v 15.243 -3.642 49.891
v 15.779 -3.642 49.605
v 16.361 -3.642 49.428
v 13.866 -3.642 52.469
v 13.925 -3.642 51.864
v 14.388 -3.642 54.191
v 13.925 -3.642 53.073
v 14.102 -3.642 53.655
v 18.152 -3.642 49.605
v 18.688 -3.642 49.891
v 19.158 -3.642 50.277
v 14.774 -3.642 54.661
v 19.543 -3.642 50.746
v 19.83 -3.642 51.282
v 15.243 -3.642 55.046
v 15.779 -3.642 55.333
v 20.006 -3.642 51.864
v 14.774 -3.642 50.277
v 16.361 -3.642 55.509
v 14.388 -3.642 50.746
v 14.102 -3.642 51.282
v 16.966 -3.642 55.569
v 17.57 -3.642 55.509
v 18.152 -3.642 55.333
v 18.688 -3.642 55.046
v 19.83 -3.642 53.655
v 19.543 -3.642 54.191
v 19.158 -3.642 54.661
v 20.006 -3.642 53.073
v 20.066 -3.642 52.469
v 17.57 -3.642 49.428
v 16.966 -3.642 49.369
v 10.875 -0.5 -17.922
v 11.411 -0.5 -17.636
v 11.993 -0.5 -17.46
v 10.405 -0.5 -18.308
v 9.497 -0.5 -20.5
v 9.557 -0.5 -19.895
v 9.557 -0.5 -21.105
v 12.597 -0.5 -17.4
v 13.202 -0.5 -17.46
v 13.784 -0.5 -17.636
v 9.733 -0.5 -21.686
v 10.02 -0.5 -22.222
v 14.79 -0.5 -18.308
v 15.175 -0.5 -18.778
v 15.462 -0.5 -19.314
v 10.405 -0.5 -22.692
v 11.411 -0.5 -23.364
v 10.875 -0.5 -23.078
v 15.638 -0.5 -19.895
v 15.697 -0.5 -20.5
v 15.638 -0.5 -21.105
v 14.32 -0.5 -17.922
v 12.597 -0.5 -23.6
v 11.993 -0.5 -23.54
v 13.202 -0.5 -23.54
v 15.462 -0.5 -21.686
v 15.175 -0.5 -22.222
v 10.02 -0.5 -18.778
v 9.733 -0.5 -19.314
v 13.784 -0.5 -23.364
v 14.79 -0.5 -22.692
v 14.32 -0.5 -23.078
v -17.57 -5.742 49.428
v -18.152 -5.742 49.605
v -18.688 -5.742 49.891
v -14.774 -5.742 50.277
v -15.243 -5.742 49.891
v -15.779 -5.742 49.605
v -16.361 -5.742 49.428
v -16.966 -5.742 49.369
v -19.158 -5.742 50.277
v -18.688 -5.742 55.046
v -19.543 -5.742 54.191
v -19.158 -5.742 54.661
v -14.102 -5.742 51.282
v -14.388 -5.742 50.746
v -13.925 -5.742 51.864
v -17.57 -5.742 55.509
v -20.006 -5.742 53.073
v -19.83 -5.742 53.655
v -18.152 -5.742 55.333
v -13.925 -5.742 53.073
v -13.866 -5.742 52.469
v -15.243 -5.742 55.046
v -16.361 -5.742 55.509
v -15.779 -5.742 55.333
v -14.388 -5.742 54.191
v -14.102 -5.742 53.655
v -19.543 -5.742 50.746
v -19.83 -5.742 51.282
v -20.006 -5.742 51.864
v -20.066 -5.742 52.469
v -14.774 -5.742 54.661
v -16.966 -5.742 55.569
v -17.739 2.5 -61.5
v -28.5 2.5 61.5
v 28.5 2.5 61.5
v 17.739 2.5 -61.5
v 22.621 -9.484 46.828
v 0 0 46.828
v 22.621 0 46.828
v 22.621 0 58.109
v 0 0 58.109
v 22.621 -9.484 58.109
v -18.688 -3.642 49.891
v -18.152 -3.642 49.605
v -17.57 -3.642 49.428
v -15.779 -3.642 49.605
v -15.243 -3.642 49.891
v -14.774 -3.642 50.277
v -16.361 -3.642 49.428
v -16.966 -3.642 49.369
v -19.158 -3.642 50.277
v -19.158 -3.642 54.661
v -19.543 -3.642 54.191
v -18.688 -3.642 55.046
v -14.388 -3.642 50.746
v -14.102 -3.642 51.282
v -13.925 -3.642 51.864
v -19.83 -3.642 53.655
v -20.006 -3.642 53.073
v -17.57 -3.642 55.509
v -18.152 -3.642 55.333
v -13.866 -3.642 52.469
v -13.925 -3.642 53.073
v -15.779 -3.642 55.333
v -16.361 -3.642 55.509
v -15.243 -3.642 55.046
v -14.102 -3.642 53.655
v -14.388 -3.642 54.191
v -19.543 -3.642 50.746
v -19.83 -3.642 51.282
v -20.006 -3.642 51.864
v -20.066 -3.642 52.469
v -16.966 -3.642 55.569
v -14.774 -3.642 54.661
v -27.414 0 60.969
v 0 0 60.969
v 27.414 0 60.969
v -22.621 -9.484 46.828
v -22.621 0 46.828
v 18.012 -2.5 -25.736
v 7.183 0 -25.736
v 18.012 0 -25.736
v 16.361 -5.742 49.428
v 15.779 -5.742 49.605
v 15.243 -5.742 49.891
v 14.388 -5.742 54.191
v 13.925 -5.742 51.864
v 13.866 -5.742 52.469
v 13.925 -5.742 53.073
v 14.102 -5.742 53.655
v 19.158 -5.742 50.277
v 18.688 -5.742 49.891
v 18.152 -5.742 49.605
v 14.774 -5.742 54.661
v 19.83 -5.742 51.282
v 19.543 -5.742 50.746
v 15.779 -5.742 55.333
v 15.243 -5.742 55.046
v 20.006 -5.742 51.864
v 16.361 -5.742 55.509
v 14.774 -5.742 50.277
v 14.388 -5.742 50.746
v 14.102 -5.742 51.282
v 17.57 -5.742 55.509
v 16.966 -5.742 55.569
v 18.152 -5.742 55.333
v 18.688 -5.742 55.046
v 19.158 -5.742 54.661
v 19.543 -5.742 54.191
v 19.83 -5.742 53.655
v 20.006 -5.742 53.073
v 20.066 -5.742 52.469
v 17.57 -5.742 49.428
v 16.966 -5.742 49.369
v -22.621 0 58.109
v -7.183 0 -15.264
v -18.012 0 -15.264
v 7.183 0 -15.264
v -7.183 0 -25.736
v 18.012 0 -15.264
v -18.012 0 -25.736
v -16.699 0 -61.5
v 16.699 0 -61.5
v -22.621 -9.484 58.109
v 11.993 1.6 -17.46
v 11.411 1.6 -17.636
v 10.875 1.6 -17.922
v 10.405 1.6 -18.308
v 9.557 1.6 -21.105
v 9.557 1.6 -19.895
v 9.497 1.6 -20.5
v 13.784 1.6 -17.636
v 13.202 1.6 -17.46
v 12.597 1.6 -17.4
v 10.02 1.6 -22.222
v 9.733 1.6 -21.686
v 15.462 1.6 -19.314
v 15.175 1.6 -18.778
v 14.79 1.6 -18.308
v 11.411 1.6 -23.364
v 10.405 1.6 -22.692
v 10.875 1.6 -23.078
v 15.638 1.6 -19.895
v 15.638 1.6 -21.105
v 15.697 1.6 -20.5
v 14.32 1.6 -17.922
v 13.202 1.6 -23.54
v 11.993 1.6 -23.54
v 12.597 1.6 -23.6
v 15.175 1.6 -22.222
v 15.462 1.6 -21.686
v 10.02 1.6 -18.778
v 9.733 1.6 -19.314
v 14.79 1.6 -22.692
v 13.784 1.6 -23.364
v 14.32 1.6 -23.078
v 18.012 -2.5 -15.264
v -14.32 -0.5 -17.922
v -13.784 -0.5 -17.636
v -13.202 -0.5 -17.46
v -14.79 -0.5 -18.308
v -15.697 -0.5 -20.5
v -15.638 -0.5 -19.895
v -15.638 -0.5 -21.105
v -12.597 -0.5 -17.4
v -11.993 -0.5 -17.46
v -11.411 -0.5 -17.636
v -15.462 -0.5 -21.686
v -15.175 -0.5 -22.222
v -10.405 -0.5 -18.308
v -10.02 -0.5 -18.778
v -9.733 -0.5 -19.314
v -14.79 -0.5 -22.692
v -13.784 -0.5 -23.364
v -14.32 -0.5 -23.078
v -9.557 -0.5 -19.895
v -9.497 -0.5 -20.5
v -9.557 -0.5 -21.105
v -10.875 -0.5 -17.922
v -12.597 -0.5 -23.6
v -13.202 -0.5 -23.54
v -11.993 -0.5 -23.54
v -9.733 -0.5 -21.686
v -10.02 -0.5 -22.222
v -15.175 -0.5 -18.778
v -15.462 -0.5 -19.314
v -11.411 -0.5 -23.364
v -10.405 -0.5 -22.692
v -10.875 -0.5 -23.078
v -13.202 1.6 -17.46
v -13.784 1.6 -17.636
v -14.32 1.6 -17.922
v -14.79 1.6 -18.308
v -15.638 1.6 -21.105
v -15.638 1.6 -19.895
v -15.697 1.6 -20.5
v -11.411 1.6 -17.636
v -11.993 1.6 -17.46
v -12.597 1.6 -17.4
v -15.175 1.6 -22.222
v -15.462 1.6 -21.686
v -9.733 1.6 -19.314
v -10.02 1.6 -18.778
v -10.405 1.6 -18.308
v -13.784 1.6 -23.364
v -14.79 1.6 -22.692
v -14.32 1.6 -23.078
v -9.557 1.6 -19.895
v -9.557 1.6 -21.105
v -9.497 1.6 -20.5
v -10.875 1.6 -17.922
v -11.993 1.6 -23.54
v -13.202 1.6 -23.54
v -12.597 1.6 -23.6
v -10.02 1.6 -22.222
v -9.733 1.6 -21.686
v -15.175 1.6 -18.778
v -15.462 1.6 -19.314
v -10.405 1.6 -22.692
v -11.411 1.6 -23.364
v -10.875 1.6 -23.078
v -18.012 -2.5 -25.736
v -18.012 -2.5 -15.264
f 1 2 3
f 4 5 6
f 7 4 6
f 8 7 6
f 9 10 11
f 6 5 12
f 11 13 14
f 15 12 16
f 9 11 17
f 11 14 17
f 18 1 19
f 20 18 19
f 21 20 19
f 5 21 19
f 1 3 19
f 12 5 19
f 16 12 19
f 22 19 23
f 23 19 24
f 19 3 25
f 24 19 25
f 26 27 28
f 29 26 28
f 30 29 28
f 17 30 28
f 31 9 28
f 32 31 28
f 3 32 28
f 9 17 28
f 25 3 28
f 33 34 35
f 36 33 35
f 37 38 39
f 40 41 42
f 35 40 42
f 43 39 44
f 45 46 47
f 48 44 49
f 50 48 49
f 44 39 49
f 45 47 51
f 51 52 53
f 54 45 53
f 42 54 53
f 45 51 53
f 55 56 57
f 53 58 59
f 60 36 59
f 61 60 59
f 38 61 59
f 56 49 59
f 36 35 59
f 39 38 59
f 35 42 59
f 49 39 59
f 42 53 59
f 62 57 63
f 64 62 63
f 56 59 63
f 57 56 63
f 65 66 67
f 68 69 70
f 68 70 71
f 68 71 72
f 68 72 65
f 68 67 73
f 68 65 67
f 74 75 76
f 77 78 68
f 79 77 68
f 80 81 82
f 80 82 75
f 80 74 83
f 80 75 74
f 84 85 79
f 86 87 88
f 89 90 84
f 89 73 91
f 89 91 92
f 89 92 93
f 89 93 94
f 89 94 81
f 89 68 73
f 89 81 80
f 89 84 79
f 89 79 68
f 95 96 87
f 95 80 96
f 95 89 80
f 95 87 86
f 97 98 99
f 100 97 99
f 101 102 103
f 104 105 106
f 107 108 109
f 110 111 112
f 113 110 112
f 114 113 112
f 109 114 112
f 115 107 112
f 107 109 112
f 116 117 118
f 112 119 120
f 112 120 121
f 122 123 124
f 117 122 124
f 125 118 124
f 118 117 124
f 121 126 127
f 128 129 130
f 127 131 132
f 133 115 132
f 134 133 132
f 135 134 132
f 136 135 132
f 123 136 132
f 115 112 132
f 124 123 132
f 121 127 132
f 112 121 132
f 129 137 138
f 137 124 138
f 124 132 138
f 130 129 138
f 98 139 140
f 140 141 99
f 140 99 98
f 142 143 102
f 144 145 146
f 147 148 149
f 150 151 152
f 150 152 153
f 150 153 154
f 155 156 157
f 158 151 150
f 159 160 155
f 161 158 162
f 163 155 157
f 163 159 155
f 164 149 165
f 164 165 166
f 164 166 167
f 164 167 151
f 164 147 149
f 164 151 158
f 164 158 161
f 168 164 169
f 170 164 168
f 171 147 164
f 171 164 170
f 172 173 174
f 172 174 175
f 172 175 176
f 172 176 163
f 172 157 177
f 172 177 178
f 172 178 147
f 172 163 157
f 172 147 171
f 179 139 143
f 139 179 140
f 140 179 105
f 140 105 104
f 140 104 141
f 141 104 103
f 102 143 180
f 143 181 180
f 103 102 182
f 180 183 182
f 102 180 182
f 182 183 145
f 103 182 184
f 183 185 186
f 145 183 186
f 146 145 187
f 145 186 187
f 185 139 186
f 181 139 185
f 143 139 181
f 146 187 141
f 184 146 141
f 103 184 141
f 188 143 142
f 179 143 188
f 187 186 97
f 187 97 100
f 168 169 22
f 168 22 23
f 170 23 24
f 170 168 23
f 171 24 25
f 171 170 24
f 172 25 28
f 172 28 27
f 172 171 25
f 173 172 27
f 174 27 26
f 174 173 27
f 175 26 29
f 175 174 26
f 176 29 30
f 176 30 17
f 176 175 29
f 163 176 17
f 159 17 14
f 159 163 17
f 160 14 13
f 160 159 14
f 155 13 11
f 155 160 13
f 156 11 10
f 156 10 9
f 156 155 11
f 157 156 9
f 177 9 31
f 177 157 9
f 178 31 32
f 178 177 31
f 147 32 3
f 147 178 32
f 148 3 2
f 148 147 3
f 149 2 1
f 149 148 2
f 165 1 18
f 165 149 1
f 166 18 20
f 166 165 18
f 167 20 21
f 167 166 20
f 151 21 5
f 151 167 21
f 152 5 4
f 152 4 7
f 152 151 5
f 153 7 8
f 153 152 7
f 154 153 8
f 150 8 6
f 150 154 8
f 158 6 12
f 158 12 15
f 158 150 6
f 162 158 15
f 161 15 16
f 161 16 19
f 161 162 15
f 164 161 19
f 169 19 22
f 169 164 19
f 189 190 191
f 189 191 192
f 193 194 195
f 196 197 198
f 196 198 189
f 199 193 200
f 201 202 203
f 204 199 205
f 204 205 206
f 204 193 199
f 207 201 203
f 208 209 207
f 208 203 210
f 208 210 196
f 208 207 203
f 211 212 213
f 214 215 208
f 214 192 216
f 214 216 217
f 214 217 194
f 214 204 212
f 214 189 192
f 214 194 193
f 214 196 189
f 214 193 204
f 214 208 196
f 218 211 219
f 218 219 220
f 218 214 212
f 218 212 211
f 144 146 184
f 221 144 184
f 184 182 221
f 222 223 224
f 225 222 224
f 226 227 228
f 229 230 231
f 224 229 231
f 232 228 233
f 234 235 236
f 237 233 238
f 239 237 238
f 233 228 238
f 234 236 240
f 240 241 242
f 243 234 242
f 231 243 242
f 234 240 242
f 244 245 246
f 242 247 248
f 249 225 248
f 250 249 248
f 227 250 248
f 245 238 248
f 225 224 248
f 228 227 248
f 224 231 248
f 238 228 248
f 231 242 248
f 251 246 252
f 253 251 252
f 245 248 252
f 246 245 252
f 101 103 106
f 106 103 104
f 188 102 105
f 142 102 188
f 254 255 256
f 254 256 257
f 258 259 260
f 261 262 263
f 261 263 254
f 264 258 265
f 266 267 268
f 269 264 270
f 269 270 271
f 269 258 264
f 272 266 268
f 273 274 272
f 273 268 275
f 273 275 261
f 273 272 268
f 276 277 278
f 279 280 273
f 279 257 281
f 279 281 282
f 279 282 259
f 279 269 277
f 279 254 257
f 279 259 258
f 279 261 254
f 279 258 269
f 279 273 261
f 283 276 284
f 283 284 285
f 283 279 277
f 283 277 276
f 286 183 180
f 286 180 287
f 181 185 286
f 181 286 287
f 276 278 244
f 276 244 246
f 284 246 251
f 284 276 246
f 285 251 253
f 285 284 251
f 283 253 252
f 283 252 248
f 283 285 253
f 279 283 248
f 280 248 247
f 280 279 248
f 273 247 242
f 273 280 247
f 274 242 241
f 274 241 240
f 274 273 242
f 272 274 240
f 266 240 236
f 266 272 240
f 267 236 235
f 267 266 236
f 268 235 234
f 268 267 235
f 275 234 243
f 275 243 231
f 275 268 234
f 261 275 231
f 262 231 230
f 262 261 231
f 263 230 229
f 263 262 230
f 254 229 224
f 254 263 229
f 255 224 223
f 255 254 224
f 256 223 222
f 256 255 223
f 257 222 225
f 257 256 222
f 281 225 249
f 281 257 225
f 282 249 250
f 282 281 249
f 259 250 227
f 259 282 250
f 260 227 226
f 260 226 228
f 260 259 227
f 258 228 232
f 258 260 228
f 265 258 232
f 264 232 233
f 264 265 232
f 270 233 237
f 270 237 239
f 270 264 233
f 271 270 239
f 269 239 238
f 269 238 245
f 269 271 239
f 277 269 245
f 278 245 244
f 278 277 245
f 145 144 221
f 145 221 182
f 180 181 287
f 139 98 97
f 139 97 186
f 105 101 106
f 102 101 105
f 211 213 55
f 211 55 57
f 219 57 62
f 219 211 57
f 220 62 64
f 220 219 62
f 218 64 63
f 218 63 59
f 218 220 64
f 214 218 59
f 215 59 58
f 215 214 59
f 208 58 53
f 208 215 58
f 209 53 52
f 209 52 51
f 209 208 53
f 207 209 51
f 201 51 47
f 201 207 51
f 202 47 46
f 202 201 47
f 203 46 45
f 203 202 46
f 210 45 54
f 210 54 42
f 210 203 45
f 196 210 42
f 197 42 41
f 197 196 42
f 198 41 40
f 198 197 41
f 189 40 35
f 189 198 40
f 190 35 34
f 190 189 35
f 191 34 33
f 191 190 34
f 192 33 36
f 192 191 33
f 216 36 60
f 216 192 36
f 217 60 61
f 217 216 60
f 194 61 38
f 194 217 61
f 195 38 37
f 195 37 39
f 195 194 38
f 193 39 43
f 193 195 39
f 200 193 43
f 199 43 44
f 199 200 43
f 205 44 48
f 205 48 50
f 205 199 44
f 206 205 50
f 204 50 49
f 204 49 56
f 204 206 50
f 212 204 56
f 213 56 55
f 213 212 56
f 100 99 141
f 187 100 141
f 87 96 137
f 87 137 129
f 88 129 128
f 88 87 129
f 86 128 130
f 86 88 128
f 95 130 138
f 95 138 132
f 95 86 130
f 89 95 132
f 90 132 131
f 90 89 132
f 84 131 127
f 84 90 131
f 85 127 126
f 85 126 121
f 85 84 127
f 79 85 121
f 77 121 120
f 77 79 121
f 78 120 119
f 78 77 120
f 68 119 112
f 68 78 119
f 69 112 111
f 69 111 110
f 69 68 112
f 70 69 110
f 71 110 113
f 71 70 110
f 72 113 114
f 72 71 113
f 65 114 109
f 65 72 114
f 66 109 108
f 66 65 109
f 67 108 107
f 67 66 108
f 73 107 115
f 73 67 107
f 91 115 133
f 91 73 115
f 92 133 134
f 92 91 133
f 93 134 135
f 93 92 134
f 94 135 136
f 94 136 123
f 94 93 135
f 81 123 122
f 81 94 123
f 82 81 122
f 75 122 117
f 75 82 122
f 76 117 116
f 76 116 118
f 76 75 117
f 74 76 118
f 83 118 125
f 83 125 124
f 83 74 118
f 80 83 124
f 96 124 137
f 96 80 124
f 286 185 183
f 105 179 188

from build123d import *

# Parameters (mm, degrees)
SKIZZE1_W                            = 57
SKIZZE1_H                            = 123
AUFSATZ_LINEAR_AUSTRAGEN1_DEPTH      = 2.5
SCHNITT_LINEAR_AUSTRAGEN1_DEPTH      = 84.889808678
SCHNITT_LINEAR_AUSTRAGEN2_DEPTH      = 68.828828679
SCHNITT_LINEAR_AUSTRAGEN3_DEPTH      = 70.726045338
SCHNITT_LINEAR_AUSTRAGEN3_DEPTH_BACK = 70.726045338
SCHNITT_LINEAR_AUSTRAGEN4_DEPTH      = 70.47454308
SCHNITT_LINEAR_AUSTRAGEN4_DEPTH_BACK = 70.47454308
SKIZZE9_W                            = 45.241474544
SKIZZE9_H                            = 11.280630507
AUFSATZ_LINEAR_AUSTRAGEN2_DEPTH      = 13
SCHNITT_LINEAR_AUSTRAGEN5_DEPTH      = 20
SKIZZE12_W                           = 36.023643564
SKIZZE12_H                           = 10.472363364
AUFSATZ_LINEAR_AUSTRAGEN3_DEPTH      = 5
SCHNITT_LINEAR_AUSTRAGEN6_DEPTH      = 12
SCHNITT_LINEAR_AUSTRAGEN8_DEPTH      = 0.5
SCHNITT_LINEAR_AUSTRAGEN8_DEPTH_BACK = 1.6
SKIZZE16_R                           = 3.1
SCHNITT_LINEAR_AUSTRAGEN9_DEPTH      = 1.1
SCHNITT_LINEAR_AUSTRAGEN9_DEPTH_BACK = 1
SKIZZE17_R                           = 3.1


with BuildPart() as part:
    # Skizze1 → Aufsatz-Linear austragen1 (new body)
    with BuildSketch(Plane(origin=(0, 0, 0), x_dir=(1, 0, 0), z_dir=(0, 1, 0))):
        Rectangle(SKIZZE1_W, SKIZZE1_H)
    extrude(amount=AUFSATZ_LINEAR_AUSTRAGEN1_DEPTH)

    # Skizze2 → Schnitt-Linear austragen1 (cut, through all)
    with BuildSketch(Plane(origin=(28.5, 0, 0), x_dir=(0, 0, -1), z_dir=(1, 0, 0))):
        Polygon((-61.5, 2.5), (-61.5, 0), (-60.968608596, 0), align=None)
    extrude(amount=-SCHNITT_LINEAR_AUSTRAGEN1_DEPTH, mode=Mode.SUBTRACT)

    # Skizze3 → Schnitt-Linear austragen2 (cut, through all)
    with BuildSketch(Plane(origin=(0, 2.5, 0), x_dir=(1, 0, 0), z_dir=(0, 1, 0))):
        Polygon((-28.5, -61.5), (-17.738894386, 61.5), (-28.5, 61.5), align=None)
        Polygon((28.5, -61.5), (17.738894386, 61.5), (28.5, 61.5), align=None)
    extrude(amount=-SCHNITT_LINEAR_AUSTRAGEN2_DEPTH, mode=Mode.SUBTRACT)

    # Skizze5 → Schnitt-Linear austragen3 (cut, two sides: drawn at the far end of the back side and taken through both)
    with BuildSketch(Plane(origin=(0.175618176, 0, 2.007324937), x_dir=(0, -1, 0), z_dir=(0.08715574274765484, 0, 0.9961946980917459)).offset(-SCHNITT_LINEAR_AUSTRAGEN3_DEPTH_BACK)):
        Polygon((0.008562414, 23.031470717), (-2.5, 23.031470717), (0, 21.995936811), align=None)
    extrude(amount=SCHNITT_LINEAR_AUSTRAGEN3_DEPTH + SCHNITT_LINEAR_AUSTRAGEN3_DEPTH_BACK, mode=Mode.SUBTRACT)

    # Skizze6 → Schnitt-Linear austragen4 (cut, two sides: drawn at the far end of the back side and taken through both)
    with BuildSketch(Plane(origin=(-0.152372814, 0, 1.741629235), x_dir=(0, 1, 0), z_dir=(-0.08715574274766175, 0, 0.9961946980917452)).offset(-SCHNITT_LINEAR_AUSTRAGEN4_DEPTH_BACK)):
        Polygon((2.5, 23.031470717), (0, 21.995936811), (0, 23.031470717), align=None)
    extrude(amount=SCHNITT_LINEAR_AUSTRAGEN4_DEPTH + SCHNITT_LINEAR_AUSTRAGEN4_DEPTH_BACK, mode=Mode.SUBTRACT)

    # Skizze9 → Aufsatz-Linear austragen2 (add)
    with BuildSketch(Plane.XZ):
        with Locations((0, 52.468608596)):
            Rectangle(SKIZZE9_W, SKIZZE9_H)
    extrude(amount=AUFSATZ_LINEAR_AUSTRAGEN2_DEPTH)

    # Skizze11 → Schnitt-Linear austragen5 (cut)
    with BuildSketch(Plane(origin=(0, 0, 46.828293342), x_dir=(-1, 0, 0), z_dir=(0, 0, -1))):
        Polygon((-22.620737272, -9.484039906), (0, 0), (22.620737272, -9.484039906), (22.620737272, -13), (-22.620737272, -13), align=None)
    extrude(amount=-SCHNITT_LINEAR_AUSTRAGEN5_DEPTH, mode=Mode.SUBTRACT)

    # Skizze12 → Aufsatz-Linear austragen3 (add)
    with BuildSketch(Plane.XZ):
        with Locations((0, -20.5)):
            Rectangle(SKIZZE12_W, SKIZZE12_H)
    extrude(amount=AUFSATZ_LINEAR_AUSTRAGEN3_DEPTH)

    # Skizze13 → Schnitt-Linear austragen6 (cut)
    with BuildSketch(Plane(origin=(0, 0, -25.736181682), x_dir=(-1, 0, 0), z_dir=(0, 0, -1))):
        Polygon((-18.011821782, -2.5), (-7.183132097, 0), (7.183132097, 0), (18.011821782, -2.5), (18.011821782, -5), (-18.011821782, -5), align=None)
    extrude(amount=-SCHNITT_LINEAR_AUSTRAGEN6_DEPTH, mode=Mode.SUBTRACT)

    # Skizze16 → Schnitt-Linear austragen8 (cut, two sides: drawn at the far end of the back side and taken through both)
    with BuildSketch(Plane.XZ.offset(-SCHNITT_LINEAR_AUSTRAGEN8_DEPTH_BACK)):
        with Locations((12.59747694, -20.5)):
            Circle(SKIZZE16_R)
        with Locations((-12.59747694, -20.5)):
            Circle(SKIZZE16_R)
    extrude(amount=SCHNITT_LINEAR_AUSTRAGEN8_DEPTH + SCHNITT_LINEAR_AUSTRAGEN8_DEPTH_BACK, mode=Mode.SUBTRACT)

    # Skizze17 → Schnitt-Linear austragen9 (cut, two sides: drawn at the far end of the back side and taken through both)
    with BuildSketch(Plane(origin=(0, -4.742019953, 0), x_dir=(1, 0, 0), z_dir=(0, 1, 0)).offset(-SCHNITT_LINEAR_AUSTRAGEN9_DEPTH_BACK)):
        with Locations((-16.965552954, -52.468608596)):
            Circle(SKIZZE17_R)
        with Locations((16.965552954, -52.468608596)):
            Circle(SKIZZE17_R)
    extrude(amount=SCHNITT_LINEAR_AUSTRAGEN9_DEPTH + SCHNITT_LINEAR_AUSTRAGEN9_DEPTH_BACK, mode=Mode.SUBTRACT)


solid = part.part
